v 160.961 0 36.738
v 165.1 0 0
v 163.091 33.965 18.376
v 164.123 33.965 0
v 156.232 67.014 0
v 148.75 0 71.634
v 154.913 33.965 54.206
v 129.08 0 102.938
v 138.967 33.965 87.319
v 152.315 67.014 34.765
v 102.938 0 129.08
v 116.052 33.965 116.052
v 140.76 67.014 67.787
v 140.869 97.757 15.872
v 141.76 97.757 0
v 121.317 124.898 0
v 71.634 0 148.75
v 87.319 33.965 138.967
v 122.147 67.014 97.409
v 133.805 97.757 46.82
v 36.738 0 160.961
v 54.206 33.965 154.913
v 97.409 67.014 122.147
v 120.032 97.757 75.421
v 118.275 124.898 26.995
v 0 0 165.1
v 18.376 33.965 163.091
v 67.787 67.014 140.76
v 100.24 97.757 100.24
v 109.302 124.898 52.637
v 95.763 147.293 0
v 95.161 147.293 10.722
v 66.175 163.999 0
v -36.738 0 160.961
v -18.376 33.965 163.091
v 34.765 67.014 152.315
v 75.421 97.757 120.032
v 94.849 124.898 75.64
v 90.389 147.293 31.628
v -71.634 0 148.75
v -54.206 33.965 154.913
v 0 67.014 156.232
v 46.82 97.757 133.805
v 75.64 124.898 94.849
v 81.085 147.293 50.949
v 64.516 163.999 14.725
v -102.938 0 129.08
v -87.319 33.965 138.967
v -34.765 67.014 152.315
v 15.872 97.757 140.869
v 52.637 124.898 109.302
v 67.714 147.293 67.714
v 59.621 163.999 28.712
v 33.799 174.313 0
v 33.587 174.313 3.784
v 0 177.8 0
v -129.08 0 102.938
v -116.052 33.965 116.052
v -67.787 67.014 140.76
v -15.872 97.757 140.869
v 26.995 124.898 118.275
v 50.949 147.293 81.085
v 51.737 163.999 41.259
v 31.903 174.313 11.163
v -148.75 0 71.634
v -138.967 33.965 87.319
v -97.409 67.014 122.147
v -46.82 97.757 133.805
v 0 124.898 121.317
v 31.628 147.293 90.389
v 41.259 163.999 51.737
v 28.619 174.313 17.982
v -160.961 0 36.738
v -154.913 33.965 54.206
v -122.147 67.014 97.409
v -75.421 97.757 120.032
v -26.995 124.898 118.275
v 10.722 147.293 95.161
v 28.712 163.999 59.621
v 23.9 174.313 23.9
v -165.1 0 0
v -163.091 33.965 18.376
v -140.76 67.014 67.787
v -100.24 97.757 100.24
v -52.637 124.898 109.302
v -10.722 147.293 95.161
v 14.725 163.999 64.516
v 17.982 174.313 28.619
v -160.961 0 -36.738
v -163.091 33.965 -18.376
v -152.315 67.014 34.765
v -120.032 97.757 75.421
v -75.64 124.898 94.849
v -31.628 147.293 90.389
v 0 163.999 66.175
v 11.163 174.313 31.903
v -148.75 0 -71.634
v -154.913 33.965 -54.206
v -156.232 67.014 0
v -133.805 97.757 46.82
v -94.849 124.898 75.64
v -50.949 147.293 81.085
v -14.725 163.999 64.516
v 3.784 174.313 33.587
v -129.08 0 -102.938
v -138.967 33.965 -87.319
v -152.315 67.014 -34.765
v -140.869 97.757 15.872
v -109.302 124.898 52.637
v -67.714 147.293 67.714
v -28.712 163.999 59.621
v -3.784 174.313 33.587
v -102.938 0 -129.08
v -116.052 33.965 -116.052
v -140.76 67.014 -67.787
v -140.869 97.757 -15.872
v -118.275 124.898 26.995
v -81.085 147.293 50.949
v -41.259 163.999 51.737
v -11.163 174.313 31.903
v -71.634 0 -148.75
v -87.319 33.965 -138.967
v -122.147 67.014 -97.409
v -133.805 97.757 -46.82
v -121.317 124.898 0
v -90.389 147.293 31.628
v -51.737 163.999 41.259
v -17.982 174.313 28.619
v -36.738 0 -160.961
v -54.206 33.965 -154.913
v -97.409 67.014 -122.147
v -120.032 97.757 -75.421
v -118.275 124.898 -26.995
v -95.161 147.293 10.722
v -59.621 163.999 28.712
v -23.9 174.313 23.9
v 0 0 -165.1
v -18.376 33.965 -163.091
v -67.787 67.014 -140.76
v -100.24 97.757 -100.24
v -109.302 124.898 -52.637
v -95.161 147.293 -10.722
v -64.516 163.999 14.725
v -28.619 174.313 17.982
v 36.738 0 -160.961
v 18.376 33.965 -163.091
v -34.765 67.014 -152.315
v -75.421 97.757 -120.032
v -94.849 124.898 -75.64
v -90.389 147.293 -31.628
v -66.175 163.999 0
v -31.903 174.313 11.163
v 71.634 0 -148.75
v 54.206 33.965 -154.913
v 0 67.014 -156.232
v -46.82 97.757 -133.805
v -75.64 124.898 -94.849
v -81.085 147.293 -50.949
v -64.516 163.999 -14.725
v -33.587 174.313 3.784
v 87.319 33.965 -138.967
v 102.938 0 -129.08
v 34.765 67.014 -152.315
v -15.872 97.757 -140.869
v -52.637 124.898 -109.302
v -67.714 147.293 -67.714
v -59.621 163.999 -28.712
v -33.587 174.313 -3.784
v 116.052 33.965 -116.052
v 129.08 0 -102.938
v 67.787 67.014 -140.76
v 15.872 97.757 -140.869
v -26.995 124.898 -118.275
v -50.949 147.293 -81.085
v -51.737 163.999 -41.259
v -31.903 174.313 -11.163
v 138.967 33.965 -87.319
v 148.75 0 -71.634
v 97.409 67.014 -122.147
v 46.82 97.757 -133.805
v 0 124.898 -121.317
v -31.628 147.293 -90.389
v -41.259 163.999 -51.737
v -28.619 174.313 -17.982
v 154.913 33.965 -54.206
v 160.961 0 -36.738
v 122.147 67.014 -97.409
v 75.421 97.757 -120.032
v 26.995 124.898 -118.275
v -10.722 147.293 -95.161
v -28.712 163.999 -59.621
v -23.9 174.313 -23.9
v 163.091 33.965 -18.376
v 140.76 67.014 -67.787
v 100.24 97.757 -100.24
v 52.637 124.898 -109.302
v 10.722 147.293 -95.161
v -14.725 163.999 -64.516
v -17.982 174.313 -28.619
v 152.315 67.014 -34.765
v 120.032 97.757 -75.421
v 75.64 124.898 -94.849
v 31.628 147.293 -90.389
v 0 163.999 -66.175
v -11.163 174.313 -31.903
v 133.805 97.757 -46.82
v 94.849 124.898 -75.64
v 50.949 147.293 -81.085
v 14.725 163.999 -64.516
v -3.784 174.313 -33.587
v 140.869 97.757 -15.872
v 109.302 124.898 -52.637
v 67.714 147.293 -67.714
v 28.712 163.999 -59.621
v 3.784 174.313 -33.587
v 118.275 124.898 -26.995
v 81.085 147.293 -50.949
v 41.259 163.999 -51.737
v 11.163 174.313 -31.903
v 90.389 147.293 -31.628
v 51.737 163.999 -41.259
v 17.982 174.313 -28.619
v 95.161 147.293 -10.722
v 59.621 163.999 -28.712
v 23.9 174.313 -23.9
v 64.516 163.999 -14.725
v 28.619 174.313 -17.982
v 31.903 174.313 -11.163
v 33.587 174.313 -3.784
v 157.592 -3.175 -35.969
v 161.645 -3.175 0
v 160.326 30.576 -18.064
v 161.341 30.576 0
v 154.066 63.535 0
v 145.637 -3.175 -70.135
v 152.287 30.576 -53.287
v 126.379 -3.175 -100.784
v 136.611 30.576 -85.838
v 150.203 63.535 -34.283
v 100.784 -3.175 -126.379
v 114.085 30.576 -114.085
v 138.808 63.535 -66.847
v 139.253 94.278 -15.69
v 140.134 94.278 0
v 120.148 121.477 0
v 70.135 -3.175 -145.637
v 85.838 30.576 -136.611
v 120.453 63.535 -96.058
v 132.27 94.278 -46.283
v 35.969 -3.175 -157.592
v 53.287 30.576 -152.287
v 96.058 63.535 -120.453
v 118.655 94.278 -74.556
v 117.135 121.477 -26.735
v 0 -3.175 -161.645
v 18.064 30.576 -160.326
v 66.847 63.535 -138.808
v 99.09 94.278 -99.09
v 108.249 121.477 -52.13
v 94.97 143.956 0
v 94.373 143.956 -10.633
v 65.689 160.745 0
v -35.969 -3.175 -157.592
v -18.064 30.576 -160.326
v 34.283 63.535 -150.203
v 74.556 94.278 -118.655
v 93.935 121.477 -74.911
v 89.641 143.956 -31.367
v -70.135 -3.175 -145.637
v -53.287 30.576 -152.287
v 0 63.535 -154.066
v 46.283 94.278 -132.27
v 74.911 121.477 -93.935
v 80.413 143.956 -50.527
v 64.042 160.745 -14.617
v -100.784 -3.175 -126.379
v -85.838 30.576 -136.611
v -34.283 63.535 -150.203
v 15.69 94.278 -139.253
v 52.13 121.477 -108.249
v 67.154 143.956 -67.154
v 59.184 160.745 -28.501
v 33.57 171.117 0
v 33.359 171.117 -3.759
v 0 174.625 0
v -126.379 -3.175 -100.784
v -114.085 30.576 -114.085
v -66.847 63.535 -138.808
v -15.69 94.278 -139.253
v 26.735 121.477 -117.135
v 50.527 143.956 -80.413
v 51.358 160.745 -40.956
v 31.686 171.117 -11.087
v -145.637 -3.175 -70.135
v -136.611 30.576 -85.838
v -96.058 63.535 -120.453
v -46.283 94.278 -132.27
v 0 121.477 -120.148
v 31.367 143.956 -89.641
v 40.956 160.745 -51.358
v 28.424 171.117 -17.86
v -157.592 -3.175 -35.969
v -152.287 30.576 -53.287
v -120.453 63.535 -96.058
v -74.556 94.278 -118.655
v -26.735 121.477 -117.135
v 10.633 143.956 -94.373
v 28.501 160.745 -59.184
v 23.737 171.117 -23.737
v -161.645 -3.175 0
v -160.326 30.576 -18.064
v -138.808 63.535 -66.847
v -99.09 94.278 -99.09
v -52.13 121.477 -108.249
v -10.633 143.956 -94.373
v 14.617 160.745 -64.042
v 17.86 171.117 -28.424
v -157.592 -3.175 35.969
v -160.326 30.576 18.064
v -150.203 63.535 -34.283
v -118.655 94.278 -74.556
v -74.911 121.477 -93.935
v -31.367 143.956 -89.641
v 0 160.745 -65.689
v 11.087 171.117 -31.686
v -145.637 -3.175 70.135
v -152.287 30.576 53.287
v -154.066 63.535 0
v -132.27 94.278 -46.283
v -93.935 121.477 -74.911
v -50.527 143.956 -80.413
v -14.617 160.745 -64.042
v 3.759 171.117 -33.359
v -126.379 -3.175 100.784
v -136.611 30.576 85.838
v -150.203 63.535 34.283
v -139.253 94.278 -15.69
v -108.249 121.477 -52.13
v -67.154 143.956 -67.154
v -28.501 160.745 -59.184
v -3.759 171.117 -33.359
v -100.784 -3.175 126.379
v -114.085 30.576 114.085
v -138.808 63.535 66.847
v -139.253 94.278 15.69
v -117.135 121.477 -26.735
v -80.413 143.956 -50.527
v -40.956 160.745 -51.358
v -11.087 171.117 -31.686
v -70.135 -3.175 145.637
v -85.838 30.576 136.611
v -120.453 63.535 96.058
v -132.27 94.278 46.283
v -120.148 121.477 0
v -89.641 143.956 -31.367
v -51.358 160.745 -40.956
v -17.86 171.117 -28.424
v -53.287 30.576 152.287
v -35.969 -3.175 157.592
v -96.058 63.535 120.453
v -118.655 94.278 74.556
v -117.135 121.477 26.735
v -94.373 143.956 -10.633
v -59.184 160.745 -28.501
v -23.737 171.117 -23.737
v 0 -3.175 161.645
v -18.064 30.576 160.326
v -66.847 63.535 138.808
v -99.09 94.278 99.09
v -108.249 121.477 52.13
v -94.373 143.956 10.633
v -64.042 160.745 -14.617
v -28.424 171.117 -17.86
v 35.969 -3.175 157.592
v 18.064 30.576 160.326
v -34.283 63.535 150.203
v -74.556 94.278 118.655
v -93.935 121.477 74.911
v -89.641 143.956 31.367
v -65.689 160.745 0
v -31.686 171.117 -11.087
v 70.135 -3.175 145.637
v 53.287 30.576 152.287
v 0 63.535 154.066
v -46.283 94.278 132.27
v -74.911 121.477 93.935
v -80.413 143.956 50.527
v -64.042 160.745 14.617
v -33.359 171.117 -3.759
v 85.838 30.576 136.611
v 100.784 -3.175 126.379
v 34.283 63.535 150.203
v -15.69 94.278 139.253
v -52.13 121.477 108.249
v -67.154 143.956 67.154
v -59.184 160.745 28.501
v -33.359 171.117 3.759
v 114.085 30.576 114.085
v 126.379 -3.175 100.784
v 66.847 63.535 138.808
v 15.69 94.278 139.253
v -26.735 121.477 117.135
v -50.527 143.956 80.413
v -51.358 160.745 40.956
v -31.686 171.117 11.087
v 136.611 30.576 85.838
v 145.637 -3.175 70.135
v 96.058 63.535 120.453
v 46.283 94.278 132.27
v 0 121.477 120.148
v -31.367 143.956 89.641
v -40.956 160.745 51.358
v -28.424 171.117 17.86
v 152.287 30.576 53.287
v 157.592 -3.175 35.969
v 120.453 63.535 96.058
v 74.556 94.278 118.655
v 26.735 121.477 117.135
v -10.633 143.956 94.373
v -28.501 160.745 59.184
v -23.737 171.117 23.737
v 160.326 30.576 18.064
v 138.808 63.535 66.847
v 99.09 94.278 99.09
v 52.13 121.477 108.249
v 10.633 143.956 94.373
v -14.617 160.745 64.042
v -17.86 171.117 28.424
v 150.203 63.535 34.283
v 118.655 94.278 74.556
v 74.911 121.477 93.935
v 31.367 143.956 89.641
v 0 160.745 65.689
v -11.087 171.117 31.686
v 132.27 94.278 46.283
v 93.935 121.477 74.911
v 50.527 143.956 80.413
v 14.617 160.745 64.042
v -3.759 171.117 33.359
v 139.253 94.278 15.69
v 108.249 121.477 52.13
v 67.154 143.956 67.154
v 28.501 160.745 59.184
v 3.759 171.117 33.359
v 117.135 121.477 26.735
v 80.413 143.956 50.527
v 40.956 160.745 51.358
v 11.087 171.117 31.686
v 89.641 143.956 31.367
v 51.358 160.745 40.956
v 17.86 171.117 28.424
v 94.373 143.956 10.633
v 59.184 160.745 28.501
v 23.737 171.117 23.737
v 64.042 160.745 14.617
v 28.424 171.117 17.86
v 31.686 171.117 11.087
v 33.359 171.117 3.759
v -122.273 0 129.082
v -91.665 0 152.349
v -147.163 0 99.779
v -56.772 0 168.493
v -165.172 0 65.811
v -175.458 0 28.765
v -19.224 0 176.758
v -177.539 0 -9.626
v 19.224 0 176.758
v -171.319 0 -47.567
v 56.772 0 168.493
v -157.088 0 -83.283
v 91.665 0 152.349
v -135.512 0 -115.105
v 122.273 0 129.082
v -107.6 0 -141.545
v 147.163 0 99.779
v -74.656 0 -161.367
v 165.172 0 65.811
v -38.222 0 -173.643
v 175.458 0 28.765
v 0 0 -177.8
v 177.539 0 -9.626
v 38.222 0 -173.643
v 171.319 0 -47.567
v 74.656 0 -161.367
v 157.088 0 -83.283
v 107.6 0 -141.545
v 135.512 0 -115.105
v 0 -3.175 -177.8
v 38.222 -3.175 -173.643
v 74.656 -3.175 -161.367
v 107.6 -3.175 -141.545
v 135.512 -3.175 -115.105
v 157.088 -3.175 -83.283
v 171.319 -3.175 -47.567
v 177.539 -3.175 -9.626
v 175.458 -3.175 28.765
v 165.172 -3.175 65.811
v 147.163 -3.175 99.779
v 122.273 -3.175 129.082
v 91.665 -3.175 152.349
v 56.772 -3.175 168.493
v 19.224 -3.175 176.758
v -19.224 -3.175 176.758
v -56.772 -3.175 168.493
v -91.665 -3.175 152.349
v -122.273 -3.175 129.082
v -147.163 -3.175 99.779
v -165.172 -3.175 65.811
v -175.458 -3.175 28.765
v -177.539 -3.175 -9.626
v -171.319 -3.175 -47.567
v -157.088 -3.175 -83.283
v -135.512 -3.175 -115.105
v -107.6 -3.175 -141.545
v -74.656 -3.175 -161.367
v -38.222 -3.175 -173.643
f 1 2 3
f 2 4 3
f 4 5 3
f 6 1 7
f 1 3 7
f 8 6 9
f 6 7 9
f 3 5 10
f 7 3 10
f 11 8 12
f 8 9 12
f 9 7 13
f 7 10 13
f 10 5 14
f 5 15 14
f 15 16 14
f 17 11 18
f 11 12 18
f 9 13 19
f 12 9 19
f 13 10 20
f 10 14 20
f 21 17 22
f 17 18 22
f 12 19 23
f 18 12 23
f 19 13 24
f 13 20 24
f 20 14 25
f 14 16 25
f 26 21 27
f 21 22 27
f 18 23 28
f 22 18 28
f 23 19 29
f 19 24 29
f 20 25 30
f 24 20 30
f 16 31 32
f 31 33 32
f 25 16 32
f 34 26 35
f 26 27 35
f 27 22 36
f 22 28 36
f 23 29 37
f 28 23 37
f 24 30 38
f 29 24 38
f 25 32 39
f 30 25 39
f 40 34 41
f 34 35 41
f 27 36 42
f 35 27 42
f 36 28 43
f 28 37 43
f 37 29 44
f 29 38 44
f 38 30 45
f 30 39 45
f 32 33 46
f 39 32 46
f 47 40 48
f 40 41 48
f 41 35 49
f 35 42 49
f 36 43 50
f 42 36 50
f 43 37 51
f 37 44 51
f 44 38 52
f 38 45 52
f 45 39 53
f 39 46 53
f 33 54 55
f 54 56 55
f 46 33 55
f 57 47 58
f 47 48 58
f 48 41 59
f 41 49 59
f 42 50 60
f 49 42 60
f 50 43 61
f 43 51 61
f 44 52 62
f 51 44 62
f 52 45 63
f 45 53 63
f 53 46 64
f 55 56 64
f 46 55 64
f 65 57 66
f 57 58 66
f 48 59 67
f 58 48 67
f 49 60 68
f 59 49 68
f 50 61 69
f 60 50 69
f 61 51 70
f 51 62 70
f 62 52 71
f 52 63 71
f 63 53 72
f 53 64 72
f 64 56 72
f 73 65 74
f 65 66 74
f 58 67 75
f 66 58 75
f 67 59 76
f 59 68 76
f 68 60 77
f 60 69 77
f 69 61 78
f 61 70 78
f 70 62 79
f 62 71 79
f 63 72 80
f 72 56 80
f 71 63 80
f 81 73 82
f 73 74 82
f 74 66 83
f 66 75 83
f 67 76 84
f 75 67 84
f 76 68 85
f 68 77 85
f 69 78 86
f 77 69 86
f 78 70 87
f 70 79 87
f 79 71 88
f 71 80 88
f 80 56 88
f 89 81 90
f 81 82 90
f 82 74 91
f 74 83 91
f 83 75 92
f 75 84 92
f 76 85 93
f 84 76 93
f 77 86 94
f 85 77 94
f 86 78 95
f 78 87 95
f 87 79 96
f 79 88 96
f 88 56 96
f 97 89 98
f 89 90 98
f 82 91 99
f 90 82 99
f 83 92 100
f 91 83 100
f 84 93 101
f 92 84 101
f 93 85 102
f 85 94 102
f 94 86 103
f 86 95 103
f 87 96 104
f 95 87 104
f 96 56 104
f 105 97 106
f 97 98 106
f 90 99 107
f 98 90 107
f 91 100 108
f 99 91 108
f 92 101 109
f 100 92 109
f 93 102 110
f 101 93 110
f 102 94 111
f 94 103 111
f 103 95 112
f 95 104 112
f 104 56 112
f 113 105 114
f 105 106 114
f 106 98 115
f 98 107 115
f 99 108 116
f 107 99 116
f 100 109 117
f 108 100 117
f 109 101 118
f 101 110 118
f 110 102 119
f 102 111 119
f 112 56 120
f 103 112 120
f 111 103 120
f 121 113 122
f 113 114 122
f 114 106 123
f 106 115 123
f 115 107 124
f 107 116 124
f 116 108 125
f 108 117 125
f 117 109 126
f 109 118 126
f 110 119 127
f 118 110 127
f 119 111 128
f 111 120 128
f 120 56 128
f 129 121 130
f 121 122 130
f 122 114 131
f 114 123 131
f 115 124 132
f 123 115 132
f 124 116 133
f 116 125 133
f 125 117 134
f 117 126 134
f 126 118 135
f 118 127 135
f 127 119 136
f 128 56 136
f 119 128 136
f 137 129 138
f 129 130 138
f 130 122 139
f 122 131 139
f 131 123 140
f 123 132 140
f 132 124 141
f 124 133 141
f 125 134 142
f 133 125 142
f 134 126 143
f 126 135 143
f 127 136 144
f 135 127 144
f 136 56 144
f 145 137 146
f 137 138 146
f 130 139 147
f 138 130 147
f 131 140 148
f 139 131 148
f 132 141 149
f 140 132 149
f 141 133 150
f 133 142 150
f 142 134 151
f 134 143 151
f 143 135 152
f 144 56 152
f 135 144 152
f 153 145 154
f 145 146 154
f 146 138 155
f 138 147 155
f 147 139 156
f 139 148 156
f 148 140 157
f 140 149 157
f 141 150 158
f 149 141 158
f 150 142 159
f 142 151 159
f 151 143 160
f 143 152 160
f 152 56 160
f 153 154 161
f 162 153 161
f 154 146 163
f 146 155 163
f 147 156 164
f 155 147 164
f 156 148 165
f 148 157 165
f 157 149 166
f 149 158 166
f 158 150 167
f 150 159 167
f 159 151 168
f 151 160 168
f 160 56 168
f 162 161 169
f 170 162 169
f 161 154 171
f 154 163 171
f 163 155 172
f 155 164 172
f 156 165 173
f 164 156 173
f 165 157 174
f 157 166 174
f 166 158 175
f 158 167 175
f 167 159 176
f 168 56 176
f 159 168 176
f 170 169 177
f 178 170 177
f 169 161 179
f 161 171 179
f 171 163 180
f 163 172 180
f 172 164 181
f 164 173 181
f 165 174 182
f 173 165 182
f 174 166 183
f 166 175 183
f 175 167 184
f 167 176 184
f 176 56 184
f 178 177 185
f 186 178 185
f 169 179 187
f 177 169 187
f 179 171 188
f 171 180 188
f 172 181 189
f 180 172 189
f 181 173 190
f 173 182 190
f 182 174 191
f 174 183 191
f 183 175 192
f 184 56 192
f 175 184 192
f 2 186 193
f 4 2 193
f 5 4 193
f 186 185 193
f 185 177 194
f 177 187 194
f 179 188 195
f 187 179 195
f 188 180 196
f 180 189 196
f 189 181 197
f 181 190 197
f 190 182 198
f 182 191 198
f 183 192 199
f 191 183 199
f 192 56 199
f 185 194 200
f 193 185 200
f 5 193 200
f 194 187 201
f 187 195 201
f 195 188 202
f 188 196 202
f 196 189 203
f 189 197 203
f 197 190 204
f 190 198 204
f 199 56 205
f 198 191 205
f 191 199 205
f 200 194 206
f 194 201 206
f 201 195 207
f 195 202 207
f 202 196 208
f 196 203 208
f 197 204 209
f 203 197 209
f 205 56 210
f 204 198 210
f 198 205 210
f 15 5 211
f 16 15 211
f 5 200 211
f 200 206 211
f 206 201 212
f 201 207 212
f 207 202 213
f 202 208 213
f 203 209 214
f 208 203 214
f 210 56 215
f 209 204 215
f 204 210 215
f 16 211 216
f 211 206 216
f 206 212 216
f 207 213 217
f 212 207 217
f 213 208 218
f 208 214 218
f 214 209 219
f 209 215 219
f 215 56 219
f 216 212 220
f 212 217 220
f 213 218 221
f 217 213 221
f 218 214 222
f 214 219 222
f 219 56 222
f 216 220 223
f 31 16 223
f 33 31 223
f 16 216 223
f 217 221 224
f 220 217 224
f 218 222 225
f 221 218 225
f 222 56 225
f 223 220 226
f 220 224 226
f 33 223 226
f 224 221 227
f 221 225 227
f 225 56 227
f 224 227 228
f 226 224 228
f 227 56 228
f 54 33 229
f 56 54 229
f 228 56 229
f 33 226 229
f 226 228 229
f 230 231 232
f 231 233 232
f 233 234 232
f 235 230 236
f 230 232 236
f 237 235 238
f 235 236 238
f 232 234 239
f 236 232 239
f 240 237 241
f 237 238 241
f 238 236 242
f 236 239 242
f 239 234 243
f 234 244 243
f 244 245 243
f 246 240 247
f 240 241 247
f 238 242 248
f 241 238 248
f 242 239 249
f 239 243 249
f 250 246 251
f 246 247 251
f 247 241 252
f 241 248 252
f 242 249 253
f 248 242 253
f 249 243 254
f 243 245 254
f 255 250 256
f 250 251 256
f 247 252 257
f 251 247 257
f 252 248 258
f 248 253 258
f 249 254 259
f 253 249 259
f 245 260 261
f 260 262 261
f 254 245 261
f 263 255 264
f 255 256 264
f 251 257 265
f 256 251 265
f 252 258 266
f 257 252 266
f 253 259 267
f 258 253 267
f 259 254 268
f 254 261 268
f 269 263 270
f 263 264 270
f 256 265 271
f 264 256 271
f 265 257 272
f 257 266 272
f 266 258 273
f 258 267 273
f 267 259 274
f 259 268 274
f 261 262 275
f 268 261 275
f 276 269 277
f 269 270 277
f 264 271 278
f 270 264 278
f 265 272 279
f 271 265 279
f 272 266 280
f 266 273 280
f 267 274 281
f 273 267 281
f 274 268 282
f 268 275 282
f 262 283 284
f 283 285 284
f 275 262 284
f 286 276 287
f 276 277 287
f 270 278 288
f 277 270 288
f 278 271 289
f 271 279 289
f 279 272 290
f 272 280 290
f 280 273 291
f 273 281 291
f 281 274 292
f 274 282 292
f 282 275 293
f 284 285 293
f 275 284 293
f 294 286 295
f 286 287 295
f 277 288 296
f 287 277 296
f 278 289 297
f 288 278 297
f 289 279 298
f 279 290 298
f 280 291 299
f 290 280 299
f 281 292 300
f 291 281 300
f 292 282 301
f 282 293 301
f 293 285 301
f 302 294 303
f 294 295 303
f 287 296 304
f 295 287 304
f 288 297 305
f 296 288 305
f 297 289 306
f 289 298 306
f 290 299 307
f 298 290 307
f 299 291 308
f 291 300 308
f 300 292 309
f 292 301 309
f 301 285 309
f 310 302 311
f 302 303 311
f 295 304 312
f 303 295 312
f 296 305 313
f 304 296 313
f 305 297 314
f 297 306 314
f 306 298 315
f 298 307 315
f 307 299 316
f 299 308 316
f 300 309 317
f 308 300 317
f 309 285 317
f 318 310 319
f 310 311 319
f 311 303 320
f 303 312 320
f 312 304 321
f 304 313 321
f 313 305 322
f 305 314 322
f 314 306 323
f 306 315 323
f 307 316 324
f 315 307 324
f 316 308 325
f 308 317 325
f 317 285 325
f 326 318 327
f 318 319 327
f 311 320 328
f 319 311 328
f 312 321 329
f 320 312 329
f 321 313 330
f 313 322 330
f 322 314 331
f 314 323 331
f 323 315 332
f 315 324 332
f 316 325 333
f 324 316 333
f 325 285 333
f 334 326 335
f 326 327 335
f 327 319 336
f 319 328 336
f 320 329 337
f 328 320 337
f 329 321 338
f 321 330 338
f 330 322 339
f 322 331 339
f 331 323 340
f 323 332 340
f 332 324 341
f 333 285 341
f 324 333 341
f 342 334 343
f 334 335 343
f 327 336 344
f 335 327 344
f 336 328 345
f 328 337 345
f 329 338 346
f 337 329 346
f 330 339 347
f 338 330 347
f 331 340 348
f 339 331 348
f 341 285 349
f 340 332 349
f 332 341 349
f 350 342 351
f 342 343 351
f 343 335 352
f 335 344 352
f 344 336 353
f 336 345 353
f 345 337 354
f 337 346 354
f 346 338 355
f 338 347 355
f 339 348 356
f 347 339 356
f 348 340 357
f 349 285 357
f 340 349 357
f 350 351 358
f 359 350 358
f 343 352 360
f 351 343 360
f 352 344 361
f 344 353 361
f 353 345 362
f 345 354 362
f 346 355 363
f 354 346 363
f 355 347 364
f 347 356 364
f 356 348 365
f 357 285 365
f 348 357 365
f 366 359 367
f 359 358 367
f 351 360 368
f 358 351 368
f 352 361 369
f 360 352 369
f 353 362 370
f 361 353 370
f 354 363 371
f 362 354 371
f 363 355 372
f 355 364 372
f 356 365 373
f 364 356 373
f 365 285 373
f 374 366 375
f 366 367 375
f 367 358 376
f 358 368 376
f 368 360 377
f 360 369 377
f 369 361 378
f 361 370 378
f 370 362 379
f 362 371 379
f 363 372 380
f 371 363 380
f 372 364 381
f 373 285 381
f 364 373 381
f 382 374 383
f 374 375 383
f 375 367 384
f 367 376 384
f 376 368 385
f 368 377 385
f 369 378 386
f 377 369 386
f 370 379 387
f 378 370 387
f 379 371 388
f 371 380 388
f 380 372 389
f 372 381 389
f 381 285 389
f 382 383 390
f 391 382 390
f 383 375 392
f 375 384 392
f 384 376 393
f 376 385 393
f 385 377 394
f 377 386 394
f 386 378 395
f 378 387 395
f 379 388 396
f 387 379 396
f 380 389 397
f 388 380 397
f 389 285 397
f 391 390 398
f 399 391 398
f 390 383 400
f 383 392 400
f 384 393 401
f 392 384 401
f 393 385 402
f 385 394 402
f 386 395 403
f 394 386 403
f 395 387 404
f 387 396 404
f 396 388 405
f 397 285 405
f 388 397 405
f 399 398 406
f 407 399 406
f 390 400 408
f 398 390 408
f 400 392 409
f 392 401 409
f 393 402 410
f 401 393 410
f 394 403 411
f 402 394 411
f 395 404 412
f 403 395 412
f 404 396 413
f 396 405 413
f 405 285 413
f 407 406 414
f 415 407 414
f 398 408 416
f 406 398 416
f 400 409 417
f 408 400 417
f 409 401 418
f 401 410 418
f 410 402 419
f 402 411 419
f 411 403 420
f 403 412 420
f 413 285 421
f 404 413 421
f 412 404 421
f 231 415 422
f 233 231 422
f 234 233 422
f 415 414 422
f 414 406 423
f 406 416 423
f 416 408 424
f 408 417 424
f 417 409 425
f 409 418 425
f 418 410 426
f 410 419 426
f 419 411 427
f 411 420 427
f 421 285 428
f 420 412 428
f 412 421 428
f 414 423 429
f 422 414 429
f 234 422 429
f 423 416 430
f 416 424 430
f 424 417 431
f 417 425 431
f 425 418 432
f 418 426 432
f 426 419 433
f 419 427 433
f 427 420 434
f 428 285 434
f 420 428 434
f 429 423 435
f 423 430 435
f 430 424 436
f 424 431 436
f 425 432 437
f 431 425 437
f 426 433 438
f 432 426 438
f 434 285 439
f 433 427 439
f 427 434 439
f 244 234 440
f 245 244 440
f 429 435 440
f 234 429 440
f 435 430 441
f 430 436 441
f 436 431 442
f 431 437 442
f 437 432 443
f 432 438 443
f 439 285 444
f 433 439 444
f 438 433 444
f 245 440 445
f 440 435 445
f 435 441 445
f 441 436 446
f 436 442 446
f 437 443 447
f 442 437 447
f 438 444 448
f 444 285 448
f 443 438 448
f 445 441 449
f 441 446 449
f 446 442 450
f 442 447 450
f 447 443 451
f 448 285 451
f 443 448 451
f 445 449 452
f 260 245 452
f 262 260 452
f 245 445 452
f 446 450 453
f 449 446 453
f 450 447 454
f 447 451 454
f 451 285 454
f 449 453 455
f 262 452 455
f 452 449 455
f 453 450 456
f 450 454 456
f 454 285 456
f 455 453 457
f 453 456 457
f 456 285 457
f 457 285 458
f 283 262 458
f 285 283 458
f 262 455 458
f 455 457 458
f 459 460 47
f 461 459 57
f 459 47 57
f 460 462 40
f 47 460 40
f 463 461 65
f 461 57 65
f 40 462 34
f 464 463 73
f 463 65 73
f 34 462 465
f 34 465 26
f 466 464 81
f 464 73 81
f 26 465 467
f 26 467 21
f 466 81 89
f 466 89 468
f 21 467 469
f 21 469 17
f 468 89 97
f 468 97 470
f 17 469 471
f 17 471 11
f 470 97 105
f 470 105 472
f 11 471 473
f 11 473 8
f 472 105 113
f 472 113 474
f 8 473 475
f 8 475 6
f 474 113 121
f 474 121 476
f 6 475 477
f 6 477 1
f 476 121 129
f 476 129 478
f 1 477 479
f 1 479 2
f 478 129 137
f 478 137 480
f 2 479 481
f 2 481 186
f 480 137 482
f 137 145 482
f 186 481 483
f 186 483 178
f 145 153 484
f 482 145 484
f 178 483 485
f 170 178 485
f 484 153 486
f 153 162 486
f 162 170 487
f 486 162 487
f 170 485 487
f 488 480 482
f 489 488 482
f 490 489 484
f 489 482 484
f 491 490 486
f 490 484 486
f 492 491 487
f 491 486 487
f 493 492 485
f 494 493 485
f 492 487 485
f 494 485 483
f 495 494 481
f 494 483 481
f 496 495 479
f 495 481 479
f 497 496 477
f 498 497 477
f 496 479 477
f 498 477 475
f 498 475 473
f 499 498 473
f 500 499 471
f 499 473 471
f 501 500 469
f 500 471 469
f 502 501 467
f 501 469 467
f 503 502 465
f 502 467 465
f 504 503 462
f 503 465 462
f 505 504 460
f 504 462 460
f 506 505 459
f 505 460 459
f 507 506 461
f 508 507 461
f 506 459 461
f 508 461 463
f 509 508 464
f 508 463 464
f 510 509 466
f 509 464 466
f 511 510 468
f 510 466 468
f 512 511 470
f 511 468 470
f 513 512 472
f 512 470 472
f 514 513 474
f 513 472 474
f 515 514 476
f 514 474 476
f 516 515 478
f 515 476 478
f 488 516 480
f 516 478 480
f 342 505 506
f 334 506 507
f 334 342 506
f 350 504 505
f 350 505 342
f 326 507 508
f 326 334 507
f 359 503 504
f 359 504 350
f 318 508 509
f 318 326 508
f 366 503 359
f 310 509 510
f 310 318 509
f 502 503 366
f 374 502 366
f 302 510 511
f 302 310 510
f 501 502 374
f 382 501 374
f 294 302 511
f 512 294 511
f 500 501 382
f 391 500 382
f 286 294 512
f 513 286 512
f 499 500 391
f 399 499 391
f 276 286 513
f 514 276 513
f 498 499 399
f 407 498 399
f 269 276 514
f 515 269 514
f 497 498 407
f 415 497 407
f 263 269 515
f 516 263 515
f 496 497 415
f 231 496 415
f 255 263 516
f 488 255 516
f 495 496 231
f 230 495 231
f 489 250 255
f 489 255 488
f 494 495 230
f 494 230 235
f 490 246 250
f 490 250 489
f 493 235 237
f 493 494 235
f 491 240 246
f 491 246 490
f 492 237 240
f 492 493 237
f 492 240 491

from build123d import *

# Parameters (mm, degrees)
SKETCH3_R           = 177.8
BOSS_EXTRUDE1_DEPTH = 3.175


# Read off the part's stored shape, not the designer's step: Shell1
with BuildPart() as part:
    # Sketch1 → Revolve1 (revolve)
    with BuildSketch(Plane.XY):
        with BuildLine():
            Line((0, 177.8), (0, 0))
            Line((0, 0), (165.1, 0))
            ThreePointArc((165.1, 0), (121.316579658, 124.897538254), (0, 177.8))
        make_face()
    revolve(axis=Axis((0, 177.8, 0), (0, -1, 0)))

    # Sketch3 → Boss-Extrude1 (add)
    with BuildSketch(Plane.XZ):
        with Locations(Location((0, 0, 0), (0, 0, 270))):
            Circle(SKETCH3_R)
    extrude(amount=BOSS_EXTRUDE1_DEPTH)

    # Shell1 outline → Shell1 (revolve, cut)
    with BuildSketch(Plane.XY):
        with BuildLine():
            ThreePointArc((161.64461017, -3.1750001), (120.147638379, 121.477126871), (0, 174.625))
            Line((0, 174.625), (0, -3.1750001))
            Line((0, -3.1750001), (161.64461017, -3.1750001))
        make_face()
    revolve(axis=Axis((0, 0, 0), (0, 1, 0)), mode=Mode.SUBTRACT)


solid = part.part
